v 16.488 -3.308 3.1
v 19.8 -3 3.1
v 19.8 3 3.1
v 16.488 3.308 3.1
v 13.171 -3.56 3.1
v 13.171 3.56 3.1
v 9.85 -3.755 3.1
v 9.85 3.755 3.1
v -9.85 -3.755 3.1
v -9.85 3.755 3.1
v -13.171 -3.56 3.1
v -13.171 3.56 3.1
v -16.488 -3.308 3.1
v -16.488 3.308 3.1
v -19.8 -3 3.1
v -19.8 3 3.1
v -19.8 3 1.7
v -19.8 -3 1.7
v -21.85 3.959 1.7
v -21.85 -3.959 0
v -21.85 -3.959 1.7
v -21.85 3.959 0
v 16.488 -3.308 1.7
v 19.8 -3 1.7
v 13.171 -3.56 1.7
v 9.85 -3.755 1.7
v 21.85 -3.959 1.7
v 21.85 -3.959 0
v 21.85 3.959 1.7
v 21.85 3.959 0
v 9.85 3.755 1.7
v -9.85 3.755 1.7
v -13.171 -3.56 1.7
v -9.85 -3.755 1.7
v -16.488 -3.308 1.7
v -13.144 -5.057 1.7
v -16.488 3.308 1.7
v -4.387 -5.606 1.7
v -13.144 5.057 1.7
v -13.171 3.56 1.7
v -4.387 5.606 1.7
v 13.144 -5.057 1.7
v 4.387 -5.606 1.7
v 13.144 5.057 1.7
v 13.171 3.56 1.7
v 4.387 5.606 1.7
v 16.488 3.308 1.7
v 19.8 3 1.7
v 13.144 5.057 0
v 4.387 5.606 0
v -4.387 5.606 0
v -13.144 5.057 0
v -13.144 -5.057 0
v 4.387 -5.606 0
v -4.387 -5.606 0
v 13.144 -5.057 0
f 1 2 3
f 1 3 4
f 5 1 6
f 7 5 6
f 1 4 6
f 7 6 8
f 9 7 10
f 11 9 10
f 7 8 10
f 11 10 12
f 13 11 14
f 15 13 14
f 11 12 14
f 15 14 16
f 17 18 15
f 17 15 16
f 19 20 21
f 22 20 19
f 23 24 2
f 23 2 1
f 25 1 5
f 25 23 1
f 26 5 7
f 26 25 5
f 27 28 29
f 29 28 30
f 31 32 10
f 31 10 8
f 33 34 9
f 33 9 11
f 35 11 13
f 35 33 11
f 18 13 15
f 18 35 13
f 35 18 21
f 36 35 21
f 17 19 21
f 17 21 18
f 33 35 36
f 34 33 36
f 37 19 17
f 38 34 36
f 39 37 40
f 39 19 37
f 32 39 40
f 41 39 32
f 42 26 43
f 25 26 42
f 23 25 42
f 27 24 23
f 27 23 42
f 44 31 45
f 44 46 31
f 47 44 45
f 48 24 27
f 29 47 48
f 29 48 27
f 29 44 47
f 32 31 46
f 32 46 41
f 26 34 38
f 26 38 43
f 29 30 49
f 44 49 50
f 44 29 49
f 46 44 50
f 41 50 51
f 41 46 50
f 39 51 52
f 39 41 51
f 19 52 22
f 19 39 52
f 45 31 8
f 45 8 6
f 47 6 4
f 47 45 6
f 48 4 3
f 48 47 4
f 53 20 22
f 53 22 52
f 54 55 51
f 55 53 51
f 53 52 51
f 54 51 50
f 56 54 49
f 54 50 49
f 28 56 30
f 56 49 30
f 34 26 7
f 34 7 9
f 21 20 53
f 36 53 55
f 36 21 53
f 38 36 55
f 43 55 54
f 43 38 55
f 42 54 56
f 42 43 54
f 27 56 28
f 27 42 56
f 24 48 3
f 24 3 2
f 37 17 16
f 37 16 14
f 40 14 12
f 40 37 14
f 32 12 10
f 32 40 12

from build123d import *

# Parameters (mm, degrees)
SKETCH_1_W          = 43.7
SKETCH_1_H          = 11.35
EXTRUDE_1_DEPTH     = 1.7
SKETCH_2_OUTSIDE_W  = 54.736
SKETCH_2_OUTSIDE_H  = 22.386
CUT_EXTRUDE_3_DEPTH = 23.638863156
EXTRUDE_4_DEPTH     = 1.4


with BuildPart() as part:
    # Эскиз1 → Вытянуть1 (new body)
    with BuildSketch(Plane.XY):
        Rectangle(SKETCH_1_W, SKETCH_1_H)
    extrude(amount=EXTRUDE_1_DEPTH)

    # Эскиз2 outside → Вытянуть3 (cut, through all)
    with BuildSketch(Plane.XY.offset(1.7)):
        Rectangle(SKETCH_2_OUTSIDE_W, SKETCH_2_OUTSIDE_H)
        with BuildLine():
            ThreePointArc((39.456233665, 0), (0, 5.675), (-39.456233665, 0))
            ThreePointArc((-39.456233665, 0), (0, -5.675), (39.456233665, 0))
        make_face(mode=Mode.SUBTRACT)
    extrude(amount=-CUT_EXTRUDE_3_DEPTH, mode=Mode.SUBTRACT)

    # Эскиз3 → Вытянуть4 (add)
    with BuildSketch(Plane.XY.offset(1.7)):
        with BuildLine():
            Line((-9.85, 3.755003836), (9.85, 3.755003836))
            ThreePointArc((9.85, 3.755003836), (14.829805552, 3.440833038), (19.8, 3))
            Line((19.8, 3), (19.8, -3))
            ThreePointArc((19.8, -3), (14.829805552, -3.440833038), (9.85, -3.755003836))
            Line((9.85, -3.755003836), (-9.85, -3.755003836))
            ThreePointArc((-9.85, -3.755003836), (-14.829805552, -3.440833038), (-19.8, -3))
            Line((-19.8, -3), (-19.8, 3))
            ThreePointArc((-19.8, 3), (-14.829805552, 3.440833038), (-9.85, 3.755003836))
        make_face()
    extrude(amount=EXTRUDE_4_DEPTH)


solid = part.part
